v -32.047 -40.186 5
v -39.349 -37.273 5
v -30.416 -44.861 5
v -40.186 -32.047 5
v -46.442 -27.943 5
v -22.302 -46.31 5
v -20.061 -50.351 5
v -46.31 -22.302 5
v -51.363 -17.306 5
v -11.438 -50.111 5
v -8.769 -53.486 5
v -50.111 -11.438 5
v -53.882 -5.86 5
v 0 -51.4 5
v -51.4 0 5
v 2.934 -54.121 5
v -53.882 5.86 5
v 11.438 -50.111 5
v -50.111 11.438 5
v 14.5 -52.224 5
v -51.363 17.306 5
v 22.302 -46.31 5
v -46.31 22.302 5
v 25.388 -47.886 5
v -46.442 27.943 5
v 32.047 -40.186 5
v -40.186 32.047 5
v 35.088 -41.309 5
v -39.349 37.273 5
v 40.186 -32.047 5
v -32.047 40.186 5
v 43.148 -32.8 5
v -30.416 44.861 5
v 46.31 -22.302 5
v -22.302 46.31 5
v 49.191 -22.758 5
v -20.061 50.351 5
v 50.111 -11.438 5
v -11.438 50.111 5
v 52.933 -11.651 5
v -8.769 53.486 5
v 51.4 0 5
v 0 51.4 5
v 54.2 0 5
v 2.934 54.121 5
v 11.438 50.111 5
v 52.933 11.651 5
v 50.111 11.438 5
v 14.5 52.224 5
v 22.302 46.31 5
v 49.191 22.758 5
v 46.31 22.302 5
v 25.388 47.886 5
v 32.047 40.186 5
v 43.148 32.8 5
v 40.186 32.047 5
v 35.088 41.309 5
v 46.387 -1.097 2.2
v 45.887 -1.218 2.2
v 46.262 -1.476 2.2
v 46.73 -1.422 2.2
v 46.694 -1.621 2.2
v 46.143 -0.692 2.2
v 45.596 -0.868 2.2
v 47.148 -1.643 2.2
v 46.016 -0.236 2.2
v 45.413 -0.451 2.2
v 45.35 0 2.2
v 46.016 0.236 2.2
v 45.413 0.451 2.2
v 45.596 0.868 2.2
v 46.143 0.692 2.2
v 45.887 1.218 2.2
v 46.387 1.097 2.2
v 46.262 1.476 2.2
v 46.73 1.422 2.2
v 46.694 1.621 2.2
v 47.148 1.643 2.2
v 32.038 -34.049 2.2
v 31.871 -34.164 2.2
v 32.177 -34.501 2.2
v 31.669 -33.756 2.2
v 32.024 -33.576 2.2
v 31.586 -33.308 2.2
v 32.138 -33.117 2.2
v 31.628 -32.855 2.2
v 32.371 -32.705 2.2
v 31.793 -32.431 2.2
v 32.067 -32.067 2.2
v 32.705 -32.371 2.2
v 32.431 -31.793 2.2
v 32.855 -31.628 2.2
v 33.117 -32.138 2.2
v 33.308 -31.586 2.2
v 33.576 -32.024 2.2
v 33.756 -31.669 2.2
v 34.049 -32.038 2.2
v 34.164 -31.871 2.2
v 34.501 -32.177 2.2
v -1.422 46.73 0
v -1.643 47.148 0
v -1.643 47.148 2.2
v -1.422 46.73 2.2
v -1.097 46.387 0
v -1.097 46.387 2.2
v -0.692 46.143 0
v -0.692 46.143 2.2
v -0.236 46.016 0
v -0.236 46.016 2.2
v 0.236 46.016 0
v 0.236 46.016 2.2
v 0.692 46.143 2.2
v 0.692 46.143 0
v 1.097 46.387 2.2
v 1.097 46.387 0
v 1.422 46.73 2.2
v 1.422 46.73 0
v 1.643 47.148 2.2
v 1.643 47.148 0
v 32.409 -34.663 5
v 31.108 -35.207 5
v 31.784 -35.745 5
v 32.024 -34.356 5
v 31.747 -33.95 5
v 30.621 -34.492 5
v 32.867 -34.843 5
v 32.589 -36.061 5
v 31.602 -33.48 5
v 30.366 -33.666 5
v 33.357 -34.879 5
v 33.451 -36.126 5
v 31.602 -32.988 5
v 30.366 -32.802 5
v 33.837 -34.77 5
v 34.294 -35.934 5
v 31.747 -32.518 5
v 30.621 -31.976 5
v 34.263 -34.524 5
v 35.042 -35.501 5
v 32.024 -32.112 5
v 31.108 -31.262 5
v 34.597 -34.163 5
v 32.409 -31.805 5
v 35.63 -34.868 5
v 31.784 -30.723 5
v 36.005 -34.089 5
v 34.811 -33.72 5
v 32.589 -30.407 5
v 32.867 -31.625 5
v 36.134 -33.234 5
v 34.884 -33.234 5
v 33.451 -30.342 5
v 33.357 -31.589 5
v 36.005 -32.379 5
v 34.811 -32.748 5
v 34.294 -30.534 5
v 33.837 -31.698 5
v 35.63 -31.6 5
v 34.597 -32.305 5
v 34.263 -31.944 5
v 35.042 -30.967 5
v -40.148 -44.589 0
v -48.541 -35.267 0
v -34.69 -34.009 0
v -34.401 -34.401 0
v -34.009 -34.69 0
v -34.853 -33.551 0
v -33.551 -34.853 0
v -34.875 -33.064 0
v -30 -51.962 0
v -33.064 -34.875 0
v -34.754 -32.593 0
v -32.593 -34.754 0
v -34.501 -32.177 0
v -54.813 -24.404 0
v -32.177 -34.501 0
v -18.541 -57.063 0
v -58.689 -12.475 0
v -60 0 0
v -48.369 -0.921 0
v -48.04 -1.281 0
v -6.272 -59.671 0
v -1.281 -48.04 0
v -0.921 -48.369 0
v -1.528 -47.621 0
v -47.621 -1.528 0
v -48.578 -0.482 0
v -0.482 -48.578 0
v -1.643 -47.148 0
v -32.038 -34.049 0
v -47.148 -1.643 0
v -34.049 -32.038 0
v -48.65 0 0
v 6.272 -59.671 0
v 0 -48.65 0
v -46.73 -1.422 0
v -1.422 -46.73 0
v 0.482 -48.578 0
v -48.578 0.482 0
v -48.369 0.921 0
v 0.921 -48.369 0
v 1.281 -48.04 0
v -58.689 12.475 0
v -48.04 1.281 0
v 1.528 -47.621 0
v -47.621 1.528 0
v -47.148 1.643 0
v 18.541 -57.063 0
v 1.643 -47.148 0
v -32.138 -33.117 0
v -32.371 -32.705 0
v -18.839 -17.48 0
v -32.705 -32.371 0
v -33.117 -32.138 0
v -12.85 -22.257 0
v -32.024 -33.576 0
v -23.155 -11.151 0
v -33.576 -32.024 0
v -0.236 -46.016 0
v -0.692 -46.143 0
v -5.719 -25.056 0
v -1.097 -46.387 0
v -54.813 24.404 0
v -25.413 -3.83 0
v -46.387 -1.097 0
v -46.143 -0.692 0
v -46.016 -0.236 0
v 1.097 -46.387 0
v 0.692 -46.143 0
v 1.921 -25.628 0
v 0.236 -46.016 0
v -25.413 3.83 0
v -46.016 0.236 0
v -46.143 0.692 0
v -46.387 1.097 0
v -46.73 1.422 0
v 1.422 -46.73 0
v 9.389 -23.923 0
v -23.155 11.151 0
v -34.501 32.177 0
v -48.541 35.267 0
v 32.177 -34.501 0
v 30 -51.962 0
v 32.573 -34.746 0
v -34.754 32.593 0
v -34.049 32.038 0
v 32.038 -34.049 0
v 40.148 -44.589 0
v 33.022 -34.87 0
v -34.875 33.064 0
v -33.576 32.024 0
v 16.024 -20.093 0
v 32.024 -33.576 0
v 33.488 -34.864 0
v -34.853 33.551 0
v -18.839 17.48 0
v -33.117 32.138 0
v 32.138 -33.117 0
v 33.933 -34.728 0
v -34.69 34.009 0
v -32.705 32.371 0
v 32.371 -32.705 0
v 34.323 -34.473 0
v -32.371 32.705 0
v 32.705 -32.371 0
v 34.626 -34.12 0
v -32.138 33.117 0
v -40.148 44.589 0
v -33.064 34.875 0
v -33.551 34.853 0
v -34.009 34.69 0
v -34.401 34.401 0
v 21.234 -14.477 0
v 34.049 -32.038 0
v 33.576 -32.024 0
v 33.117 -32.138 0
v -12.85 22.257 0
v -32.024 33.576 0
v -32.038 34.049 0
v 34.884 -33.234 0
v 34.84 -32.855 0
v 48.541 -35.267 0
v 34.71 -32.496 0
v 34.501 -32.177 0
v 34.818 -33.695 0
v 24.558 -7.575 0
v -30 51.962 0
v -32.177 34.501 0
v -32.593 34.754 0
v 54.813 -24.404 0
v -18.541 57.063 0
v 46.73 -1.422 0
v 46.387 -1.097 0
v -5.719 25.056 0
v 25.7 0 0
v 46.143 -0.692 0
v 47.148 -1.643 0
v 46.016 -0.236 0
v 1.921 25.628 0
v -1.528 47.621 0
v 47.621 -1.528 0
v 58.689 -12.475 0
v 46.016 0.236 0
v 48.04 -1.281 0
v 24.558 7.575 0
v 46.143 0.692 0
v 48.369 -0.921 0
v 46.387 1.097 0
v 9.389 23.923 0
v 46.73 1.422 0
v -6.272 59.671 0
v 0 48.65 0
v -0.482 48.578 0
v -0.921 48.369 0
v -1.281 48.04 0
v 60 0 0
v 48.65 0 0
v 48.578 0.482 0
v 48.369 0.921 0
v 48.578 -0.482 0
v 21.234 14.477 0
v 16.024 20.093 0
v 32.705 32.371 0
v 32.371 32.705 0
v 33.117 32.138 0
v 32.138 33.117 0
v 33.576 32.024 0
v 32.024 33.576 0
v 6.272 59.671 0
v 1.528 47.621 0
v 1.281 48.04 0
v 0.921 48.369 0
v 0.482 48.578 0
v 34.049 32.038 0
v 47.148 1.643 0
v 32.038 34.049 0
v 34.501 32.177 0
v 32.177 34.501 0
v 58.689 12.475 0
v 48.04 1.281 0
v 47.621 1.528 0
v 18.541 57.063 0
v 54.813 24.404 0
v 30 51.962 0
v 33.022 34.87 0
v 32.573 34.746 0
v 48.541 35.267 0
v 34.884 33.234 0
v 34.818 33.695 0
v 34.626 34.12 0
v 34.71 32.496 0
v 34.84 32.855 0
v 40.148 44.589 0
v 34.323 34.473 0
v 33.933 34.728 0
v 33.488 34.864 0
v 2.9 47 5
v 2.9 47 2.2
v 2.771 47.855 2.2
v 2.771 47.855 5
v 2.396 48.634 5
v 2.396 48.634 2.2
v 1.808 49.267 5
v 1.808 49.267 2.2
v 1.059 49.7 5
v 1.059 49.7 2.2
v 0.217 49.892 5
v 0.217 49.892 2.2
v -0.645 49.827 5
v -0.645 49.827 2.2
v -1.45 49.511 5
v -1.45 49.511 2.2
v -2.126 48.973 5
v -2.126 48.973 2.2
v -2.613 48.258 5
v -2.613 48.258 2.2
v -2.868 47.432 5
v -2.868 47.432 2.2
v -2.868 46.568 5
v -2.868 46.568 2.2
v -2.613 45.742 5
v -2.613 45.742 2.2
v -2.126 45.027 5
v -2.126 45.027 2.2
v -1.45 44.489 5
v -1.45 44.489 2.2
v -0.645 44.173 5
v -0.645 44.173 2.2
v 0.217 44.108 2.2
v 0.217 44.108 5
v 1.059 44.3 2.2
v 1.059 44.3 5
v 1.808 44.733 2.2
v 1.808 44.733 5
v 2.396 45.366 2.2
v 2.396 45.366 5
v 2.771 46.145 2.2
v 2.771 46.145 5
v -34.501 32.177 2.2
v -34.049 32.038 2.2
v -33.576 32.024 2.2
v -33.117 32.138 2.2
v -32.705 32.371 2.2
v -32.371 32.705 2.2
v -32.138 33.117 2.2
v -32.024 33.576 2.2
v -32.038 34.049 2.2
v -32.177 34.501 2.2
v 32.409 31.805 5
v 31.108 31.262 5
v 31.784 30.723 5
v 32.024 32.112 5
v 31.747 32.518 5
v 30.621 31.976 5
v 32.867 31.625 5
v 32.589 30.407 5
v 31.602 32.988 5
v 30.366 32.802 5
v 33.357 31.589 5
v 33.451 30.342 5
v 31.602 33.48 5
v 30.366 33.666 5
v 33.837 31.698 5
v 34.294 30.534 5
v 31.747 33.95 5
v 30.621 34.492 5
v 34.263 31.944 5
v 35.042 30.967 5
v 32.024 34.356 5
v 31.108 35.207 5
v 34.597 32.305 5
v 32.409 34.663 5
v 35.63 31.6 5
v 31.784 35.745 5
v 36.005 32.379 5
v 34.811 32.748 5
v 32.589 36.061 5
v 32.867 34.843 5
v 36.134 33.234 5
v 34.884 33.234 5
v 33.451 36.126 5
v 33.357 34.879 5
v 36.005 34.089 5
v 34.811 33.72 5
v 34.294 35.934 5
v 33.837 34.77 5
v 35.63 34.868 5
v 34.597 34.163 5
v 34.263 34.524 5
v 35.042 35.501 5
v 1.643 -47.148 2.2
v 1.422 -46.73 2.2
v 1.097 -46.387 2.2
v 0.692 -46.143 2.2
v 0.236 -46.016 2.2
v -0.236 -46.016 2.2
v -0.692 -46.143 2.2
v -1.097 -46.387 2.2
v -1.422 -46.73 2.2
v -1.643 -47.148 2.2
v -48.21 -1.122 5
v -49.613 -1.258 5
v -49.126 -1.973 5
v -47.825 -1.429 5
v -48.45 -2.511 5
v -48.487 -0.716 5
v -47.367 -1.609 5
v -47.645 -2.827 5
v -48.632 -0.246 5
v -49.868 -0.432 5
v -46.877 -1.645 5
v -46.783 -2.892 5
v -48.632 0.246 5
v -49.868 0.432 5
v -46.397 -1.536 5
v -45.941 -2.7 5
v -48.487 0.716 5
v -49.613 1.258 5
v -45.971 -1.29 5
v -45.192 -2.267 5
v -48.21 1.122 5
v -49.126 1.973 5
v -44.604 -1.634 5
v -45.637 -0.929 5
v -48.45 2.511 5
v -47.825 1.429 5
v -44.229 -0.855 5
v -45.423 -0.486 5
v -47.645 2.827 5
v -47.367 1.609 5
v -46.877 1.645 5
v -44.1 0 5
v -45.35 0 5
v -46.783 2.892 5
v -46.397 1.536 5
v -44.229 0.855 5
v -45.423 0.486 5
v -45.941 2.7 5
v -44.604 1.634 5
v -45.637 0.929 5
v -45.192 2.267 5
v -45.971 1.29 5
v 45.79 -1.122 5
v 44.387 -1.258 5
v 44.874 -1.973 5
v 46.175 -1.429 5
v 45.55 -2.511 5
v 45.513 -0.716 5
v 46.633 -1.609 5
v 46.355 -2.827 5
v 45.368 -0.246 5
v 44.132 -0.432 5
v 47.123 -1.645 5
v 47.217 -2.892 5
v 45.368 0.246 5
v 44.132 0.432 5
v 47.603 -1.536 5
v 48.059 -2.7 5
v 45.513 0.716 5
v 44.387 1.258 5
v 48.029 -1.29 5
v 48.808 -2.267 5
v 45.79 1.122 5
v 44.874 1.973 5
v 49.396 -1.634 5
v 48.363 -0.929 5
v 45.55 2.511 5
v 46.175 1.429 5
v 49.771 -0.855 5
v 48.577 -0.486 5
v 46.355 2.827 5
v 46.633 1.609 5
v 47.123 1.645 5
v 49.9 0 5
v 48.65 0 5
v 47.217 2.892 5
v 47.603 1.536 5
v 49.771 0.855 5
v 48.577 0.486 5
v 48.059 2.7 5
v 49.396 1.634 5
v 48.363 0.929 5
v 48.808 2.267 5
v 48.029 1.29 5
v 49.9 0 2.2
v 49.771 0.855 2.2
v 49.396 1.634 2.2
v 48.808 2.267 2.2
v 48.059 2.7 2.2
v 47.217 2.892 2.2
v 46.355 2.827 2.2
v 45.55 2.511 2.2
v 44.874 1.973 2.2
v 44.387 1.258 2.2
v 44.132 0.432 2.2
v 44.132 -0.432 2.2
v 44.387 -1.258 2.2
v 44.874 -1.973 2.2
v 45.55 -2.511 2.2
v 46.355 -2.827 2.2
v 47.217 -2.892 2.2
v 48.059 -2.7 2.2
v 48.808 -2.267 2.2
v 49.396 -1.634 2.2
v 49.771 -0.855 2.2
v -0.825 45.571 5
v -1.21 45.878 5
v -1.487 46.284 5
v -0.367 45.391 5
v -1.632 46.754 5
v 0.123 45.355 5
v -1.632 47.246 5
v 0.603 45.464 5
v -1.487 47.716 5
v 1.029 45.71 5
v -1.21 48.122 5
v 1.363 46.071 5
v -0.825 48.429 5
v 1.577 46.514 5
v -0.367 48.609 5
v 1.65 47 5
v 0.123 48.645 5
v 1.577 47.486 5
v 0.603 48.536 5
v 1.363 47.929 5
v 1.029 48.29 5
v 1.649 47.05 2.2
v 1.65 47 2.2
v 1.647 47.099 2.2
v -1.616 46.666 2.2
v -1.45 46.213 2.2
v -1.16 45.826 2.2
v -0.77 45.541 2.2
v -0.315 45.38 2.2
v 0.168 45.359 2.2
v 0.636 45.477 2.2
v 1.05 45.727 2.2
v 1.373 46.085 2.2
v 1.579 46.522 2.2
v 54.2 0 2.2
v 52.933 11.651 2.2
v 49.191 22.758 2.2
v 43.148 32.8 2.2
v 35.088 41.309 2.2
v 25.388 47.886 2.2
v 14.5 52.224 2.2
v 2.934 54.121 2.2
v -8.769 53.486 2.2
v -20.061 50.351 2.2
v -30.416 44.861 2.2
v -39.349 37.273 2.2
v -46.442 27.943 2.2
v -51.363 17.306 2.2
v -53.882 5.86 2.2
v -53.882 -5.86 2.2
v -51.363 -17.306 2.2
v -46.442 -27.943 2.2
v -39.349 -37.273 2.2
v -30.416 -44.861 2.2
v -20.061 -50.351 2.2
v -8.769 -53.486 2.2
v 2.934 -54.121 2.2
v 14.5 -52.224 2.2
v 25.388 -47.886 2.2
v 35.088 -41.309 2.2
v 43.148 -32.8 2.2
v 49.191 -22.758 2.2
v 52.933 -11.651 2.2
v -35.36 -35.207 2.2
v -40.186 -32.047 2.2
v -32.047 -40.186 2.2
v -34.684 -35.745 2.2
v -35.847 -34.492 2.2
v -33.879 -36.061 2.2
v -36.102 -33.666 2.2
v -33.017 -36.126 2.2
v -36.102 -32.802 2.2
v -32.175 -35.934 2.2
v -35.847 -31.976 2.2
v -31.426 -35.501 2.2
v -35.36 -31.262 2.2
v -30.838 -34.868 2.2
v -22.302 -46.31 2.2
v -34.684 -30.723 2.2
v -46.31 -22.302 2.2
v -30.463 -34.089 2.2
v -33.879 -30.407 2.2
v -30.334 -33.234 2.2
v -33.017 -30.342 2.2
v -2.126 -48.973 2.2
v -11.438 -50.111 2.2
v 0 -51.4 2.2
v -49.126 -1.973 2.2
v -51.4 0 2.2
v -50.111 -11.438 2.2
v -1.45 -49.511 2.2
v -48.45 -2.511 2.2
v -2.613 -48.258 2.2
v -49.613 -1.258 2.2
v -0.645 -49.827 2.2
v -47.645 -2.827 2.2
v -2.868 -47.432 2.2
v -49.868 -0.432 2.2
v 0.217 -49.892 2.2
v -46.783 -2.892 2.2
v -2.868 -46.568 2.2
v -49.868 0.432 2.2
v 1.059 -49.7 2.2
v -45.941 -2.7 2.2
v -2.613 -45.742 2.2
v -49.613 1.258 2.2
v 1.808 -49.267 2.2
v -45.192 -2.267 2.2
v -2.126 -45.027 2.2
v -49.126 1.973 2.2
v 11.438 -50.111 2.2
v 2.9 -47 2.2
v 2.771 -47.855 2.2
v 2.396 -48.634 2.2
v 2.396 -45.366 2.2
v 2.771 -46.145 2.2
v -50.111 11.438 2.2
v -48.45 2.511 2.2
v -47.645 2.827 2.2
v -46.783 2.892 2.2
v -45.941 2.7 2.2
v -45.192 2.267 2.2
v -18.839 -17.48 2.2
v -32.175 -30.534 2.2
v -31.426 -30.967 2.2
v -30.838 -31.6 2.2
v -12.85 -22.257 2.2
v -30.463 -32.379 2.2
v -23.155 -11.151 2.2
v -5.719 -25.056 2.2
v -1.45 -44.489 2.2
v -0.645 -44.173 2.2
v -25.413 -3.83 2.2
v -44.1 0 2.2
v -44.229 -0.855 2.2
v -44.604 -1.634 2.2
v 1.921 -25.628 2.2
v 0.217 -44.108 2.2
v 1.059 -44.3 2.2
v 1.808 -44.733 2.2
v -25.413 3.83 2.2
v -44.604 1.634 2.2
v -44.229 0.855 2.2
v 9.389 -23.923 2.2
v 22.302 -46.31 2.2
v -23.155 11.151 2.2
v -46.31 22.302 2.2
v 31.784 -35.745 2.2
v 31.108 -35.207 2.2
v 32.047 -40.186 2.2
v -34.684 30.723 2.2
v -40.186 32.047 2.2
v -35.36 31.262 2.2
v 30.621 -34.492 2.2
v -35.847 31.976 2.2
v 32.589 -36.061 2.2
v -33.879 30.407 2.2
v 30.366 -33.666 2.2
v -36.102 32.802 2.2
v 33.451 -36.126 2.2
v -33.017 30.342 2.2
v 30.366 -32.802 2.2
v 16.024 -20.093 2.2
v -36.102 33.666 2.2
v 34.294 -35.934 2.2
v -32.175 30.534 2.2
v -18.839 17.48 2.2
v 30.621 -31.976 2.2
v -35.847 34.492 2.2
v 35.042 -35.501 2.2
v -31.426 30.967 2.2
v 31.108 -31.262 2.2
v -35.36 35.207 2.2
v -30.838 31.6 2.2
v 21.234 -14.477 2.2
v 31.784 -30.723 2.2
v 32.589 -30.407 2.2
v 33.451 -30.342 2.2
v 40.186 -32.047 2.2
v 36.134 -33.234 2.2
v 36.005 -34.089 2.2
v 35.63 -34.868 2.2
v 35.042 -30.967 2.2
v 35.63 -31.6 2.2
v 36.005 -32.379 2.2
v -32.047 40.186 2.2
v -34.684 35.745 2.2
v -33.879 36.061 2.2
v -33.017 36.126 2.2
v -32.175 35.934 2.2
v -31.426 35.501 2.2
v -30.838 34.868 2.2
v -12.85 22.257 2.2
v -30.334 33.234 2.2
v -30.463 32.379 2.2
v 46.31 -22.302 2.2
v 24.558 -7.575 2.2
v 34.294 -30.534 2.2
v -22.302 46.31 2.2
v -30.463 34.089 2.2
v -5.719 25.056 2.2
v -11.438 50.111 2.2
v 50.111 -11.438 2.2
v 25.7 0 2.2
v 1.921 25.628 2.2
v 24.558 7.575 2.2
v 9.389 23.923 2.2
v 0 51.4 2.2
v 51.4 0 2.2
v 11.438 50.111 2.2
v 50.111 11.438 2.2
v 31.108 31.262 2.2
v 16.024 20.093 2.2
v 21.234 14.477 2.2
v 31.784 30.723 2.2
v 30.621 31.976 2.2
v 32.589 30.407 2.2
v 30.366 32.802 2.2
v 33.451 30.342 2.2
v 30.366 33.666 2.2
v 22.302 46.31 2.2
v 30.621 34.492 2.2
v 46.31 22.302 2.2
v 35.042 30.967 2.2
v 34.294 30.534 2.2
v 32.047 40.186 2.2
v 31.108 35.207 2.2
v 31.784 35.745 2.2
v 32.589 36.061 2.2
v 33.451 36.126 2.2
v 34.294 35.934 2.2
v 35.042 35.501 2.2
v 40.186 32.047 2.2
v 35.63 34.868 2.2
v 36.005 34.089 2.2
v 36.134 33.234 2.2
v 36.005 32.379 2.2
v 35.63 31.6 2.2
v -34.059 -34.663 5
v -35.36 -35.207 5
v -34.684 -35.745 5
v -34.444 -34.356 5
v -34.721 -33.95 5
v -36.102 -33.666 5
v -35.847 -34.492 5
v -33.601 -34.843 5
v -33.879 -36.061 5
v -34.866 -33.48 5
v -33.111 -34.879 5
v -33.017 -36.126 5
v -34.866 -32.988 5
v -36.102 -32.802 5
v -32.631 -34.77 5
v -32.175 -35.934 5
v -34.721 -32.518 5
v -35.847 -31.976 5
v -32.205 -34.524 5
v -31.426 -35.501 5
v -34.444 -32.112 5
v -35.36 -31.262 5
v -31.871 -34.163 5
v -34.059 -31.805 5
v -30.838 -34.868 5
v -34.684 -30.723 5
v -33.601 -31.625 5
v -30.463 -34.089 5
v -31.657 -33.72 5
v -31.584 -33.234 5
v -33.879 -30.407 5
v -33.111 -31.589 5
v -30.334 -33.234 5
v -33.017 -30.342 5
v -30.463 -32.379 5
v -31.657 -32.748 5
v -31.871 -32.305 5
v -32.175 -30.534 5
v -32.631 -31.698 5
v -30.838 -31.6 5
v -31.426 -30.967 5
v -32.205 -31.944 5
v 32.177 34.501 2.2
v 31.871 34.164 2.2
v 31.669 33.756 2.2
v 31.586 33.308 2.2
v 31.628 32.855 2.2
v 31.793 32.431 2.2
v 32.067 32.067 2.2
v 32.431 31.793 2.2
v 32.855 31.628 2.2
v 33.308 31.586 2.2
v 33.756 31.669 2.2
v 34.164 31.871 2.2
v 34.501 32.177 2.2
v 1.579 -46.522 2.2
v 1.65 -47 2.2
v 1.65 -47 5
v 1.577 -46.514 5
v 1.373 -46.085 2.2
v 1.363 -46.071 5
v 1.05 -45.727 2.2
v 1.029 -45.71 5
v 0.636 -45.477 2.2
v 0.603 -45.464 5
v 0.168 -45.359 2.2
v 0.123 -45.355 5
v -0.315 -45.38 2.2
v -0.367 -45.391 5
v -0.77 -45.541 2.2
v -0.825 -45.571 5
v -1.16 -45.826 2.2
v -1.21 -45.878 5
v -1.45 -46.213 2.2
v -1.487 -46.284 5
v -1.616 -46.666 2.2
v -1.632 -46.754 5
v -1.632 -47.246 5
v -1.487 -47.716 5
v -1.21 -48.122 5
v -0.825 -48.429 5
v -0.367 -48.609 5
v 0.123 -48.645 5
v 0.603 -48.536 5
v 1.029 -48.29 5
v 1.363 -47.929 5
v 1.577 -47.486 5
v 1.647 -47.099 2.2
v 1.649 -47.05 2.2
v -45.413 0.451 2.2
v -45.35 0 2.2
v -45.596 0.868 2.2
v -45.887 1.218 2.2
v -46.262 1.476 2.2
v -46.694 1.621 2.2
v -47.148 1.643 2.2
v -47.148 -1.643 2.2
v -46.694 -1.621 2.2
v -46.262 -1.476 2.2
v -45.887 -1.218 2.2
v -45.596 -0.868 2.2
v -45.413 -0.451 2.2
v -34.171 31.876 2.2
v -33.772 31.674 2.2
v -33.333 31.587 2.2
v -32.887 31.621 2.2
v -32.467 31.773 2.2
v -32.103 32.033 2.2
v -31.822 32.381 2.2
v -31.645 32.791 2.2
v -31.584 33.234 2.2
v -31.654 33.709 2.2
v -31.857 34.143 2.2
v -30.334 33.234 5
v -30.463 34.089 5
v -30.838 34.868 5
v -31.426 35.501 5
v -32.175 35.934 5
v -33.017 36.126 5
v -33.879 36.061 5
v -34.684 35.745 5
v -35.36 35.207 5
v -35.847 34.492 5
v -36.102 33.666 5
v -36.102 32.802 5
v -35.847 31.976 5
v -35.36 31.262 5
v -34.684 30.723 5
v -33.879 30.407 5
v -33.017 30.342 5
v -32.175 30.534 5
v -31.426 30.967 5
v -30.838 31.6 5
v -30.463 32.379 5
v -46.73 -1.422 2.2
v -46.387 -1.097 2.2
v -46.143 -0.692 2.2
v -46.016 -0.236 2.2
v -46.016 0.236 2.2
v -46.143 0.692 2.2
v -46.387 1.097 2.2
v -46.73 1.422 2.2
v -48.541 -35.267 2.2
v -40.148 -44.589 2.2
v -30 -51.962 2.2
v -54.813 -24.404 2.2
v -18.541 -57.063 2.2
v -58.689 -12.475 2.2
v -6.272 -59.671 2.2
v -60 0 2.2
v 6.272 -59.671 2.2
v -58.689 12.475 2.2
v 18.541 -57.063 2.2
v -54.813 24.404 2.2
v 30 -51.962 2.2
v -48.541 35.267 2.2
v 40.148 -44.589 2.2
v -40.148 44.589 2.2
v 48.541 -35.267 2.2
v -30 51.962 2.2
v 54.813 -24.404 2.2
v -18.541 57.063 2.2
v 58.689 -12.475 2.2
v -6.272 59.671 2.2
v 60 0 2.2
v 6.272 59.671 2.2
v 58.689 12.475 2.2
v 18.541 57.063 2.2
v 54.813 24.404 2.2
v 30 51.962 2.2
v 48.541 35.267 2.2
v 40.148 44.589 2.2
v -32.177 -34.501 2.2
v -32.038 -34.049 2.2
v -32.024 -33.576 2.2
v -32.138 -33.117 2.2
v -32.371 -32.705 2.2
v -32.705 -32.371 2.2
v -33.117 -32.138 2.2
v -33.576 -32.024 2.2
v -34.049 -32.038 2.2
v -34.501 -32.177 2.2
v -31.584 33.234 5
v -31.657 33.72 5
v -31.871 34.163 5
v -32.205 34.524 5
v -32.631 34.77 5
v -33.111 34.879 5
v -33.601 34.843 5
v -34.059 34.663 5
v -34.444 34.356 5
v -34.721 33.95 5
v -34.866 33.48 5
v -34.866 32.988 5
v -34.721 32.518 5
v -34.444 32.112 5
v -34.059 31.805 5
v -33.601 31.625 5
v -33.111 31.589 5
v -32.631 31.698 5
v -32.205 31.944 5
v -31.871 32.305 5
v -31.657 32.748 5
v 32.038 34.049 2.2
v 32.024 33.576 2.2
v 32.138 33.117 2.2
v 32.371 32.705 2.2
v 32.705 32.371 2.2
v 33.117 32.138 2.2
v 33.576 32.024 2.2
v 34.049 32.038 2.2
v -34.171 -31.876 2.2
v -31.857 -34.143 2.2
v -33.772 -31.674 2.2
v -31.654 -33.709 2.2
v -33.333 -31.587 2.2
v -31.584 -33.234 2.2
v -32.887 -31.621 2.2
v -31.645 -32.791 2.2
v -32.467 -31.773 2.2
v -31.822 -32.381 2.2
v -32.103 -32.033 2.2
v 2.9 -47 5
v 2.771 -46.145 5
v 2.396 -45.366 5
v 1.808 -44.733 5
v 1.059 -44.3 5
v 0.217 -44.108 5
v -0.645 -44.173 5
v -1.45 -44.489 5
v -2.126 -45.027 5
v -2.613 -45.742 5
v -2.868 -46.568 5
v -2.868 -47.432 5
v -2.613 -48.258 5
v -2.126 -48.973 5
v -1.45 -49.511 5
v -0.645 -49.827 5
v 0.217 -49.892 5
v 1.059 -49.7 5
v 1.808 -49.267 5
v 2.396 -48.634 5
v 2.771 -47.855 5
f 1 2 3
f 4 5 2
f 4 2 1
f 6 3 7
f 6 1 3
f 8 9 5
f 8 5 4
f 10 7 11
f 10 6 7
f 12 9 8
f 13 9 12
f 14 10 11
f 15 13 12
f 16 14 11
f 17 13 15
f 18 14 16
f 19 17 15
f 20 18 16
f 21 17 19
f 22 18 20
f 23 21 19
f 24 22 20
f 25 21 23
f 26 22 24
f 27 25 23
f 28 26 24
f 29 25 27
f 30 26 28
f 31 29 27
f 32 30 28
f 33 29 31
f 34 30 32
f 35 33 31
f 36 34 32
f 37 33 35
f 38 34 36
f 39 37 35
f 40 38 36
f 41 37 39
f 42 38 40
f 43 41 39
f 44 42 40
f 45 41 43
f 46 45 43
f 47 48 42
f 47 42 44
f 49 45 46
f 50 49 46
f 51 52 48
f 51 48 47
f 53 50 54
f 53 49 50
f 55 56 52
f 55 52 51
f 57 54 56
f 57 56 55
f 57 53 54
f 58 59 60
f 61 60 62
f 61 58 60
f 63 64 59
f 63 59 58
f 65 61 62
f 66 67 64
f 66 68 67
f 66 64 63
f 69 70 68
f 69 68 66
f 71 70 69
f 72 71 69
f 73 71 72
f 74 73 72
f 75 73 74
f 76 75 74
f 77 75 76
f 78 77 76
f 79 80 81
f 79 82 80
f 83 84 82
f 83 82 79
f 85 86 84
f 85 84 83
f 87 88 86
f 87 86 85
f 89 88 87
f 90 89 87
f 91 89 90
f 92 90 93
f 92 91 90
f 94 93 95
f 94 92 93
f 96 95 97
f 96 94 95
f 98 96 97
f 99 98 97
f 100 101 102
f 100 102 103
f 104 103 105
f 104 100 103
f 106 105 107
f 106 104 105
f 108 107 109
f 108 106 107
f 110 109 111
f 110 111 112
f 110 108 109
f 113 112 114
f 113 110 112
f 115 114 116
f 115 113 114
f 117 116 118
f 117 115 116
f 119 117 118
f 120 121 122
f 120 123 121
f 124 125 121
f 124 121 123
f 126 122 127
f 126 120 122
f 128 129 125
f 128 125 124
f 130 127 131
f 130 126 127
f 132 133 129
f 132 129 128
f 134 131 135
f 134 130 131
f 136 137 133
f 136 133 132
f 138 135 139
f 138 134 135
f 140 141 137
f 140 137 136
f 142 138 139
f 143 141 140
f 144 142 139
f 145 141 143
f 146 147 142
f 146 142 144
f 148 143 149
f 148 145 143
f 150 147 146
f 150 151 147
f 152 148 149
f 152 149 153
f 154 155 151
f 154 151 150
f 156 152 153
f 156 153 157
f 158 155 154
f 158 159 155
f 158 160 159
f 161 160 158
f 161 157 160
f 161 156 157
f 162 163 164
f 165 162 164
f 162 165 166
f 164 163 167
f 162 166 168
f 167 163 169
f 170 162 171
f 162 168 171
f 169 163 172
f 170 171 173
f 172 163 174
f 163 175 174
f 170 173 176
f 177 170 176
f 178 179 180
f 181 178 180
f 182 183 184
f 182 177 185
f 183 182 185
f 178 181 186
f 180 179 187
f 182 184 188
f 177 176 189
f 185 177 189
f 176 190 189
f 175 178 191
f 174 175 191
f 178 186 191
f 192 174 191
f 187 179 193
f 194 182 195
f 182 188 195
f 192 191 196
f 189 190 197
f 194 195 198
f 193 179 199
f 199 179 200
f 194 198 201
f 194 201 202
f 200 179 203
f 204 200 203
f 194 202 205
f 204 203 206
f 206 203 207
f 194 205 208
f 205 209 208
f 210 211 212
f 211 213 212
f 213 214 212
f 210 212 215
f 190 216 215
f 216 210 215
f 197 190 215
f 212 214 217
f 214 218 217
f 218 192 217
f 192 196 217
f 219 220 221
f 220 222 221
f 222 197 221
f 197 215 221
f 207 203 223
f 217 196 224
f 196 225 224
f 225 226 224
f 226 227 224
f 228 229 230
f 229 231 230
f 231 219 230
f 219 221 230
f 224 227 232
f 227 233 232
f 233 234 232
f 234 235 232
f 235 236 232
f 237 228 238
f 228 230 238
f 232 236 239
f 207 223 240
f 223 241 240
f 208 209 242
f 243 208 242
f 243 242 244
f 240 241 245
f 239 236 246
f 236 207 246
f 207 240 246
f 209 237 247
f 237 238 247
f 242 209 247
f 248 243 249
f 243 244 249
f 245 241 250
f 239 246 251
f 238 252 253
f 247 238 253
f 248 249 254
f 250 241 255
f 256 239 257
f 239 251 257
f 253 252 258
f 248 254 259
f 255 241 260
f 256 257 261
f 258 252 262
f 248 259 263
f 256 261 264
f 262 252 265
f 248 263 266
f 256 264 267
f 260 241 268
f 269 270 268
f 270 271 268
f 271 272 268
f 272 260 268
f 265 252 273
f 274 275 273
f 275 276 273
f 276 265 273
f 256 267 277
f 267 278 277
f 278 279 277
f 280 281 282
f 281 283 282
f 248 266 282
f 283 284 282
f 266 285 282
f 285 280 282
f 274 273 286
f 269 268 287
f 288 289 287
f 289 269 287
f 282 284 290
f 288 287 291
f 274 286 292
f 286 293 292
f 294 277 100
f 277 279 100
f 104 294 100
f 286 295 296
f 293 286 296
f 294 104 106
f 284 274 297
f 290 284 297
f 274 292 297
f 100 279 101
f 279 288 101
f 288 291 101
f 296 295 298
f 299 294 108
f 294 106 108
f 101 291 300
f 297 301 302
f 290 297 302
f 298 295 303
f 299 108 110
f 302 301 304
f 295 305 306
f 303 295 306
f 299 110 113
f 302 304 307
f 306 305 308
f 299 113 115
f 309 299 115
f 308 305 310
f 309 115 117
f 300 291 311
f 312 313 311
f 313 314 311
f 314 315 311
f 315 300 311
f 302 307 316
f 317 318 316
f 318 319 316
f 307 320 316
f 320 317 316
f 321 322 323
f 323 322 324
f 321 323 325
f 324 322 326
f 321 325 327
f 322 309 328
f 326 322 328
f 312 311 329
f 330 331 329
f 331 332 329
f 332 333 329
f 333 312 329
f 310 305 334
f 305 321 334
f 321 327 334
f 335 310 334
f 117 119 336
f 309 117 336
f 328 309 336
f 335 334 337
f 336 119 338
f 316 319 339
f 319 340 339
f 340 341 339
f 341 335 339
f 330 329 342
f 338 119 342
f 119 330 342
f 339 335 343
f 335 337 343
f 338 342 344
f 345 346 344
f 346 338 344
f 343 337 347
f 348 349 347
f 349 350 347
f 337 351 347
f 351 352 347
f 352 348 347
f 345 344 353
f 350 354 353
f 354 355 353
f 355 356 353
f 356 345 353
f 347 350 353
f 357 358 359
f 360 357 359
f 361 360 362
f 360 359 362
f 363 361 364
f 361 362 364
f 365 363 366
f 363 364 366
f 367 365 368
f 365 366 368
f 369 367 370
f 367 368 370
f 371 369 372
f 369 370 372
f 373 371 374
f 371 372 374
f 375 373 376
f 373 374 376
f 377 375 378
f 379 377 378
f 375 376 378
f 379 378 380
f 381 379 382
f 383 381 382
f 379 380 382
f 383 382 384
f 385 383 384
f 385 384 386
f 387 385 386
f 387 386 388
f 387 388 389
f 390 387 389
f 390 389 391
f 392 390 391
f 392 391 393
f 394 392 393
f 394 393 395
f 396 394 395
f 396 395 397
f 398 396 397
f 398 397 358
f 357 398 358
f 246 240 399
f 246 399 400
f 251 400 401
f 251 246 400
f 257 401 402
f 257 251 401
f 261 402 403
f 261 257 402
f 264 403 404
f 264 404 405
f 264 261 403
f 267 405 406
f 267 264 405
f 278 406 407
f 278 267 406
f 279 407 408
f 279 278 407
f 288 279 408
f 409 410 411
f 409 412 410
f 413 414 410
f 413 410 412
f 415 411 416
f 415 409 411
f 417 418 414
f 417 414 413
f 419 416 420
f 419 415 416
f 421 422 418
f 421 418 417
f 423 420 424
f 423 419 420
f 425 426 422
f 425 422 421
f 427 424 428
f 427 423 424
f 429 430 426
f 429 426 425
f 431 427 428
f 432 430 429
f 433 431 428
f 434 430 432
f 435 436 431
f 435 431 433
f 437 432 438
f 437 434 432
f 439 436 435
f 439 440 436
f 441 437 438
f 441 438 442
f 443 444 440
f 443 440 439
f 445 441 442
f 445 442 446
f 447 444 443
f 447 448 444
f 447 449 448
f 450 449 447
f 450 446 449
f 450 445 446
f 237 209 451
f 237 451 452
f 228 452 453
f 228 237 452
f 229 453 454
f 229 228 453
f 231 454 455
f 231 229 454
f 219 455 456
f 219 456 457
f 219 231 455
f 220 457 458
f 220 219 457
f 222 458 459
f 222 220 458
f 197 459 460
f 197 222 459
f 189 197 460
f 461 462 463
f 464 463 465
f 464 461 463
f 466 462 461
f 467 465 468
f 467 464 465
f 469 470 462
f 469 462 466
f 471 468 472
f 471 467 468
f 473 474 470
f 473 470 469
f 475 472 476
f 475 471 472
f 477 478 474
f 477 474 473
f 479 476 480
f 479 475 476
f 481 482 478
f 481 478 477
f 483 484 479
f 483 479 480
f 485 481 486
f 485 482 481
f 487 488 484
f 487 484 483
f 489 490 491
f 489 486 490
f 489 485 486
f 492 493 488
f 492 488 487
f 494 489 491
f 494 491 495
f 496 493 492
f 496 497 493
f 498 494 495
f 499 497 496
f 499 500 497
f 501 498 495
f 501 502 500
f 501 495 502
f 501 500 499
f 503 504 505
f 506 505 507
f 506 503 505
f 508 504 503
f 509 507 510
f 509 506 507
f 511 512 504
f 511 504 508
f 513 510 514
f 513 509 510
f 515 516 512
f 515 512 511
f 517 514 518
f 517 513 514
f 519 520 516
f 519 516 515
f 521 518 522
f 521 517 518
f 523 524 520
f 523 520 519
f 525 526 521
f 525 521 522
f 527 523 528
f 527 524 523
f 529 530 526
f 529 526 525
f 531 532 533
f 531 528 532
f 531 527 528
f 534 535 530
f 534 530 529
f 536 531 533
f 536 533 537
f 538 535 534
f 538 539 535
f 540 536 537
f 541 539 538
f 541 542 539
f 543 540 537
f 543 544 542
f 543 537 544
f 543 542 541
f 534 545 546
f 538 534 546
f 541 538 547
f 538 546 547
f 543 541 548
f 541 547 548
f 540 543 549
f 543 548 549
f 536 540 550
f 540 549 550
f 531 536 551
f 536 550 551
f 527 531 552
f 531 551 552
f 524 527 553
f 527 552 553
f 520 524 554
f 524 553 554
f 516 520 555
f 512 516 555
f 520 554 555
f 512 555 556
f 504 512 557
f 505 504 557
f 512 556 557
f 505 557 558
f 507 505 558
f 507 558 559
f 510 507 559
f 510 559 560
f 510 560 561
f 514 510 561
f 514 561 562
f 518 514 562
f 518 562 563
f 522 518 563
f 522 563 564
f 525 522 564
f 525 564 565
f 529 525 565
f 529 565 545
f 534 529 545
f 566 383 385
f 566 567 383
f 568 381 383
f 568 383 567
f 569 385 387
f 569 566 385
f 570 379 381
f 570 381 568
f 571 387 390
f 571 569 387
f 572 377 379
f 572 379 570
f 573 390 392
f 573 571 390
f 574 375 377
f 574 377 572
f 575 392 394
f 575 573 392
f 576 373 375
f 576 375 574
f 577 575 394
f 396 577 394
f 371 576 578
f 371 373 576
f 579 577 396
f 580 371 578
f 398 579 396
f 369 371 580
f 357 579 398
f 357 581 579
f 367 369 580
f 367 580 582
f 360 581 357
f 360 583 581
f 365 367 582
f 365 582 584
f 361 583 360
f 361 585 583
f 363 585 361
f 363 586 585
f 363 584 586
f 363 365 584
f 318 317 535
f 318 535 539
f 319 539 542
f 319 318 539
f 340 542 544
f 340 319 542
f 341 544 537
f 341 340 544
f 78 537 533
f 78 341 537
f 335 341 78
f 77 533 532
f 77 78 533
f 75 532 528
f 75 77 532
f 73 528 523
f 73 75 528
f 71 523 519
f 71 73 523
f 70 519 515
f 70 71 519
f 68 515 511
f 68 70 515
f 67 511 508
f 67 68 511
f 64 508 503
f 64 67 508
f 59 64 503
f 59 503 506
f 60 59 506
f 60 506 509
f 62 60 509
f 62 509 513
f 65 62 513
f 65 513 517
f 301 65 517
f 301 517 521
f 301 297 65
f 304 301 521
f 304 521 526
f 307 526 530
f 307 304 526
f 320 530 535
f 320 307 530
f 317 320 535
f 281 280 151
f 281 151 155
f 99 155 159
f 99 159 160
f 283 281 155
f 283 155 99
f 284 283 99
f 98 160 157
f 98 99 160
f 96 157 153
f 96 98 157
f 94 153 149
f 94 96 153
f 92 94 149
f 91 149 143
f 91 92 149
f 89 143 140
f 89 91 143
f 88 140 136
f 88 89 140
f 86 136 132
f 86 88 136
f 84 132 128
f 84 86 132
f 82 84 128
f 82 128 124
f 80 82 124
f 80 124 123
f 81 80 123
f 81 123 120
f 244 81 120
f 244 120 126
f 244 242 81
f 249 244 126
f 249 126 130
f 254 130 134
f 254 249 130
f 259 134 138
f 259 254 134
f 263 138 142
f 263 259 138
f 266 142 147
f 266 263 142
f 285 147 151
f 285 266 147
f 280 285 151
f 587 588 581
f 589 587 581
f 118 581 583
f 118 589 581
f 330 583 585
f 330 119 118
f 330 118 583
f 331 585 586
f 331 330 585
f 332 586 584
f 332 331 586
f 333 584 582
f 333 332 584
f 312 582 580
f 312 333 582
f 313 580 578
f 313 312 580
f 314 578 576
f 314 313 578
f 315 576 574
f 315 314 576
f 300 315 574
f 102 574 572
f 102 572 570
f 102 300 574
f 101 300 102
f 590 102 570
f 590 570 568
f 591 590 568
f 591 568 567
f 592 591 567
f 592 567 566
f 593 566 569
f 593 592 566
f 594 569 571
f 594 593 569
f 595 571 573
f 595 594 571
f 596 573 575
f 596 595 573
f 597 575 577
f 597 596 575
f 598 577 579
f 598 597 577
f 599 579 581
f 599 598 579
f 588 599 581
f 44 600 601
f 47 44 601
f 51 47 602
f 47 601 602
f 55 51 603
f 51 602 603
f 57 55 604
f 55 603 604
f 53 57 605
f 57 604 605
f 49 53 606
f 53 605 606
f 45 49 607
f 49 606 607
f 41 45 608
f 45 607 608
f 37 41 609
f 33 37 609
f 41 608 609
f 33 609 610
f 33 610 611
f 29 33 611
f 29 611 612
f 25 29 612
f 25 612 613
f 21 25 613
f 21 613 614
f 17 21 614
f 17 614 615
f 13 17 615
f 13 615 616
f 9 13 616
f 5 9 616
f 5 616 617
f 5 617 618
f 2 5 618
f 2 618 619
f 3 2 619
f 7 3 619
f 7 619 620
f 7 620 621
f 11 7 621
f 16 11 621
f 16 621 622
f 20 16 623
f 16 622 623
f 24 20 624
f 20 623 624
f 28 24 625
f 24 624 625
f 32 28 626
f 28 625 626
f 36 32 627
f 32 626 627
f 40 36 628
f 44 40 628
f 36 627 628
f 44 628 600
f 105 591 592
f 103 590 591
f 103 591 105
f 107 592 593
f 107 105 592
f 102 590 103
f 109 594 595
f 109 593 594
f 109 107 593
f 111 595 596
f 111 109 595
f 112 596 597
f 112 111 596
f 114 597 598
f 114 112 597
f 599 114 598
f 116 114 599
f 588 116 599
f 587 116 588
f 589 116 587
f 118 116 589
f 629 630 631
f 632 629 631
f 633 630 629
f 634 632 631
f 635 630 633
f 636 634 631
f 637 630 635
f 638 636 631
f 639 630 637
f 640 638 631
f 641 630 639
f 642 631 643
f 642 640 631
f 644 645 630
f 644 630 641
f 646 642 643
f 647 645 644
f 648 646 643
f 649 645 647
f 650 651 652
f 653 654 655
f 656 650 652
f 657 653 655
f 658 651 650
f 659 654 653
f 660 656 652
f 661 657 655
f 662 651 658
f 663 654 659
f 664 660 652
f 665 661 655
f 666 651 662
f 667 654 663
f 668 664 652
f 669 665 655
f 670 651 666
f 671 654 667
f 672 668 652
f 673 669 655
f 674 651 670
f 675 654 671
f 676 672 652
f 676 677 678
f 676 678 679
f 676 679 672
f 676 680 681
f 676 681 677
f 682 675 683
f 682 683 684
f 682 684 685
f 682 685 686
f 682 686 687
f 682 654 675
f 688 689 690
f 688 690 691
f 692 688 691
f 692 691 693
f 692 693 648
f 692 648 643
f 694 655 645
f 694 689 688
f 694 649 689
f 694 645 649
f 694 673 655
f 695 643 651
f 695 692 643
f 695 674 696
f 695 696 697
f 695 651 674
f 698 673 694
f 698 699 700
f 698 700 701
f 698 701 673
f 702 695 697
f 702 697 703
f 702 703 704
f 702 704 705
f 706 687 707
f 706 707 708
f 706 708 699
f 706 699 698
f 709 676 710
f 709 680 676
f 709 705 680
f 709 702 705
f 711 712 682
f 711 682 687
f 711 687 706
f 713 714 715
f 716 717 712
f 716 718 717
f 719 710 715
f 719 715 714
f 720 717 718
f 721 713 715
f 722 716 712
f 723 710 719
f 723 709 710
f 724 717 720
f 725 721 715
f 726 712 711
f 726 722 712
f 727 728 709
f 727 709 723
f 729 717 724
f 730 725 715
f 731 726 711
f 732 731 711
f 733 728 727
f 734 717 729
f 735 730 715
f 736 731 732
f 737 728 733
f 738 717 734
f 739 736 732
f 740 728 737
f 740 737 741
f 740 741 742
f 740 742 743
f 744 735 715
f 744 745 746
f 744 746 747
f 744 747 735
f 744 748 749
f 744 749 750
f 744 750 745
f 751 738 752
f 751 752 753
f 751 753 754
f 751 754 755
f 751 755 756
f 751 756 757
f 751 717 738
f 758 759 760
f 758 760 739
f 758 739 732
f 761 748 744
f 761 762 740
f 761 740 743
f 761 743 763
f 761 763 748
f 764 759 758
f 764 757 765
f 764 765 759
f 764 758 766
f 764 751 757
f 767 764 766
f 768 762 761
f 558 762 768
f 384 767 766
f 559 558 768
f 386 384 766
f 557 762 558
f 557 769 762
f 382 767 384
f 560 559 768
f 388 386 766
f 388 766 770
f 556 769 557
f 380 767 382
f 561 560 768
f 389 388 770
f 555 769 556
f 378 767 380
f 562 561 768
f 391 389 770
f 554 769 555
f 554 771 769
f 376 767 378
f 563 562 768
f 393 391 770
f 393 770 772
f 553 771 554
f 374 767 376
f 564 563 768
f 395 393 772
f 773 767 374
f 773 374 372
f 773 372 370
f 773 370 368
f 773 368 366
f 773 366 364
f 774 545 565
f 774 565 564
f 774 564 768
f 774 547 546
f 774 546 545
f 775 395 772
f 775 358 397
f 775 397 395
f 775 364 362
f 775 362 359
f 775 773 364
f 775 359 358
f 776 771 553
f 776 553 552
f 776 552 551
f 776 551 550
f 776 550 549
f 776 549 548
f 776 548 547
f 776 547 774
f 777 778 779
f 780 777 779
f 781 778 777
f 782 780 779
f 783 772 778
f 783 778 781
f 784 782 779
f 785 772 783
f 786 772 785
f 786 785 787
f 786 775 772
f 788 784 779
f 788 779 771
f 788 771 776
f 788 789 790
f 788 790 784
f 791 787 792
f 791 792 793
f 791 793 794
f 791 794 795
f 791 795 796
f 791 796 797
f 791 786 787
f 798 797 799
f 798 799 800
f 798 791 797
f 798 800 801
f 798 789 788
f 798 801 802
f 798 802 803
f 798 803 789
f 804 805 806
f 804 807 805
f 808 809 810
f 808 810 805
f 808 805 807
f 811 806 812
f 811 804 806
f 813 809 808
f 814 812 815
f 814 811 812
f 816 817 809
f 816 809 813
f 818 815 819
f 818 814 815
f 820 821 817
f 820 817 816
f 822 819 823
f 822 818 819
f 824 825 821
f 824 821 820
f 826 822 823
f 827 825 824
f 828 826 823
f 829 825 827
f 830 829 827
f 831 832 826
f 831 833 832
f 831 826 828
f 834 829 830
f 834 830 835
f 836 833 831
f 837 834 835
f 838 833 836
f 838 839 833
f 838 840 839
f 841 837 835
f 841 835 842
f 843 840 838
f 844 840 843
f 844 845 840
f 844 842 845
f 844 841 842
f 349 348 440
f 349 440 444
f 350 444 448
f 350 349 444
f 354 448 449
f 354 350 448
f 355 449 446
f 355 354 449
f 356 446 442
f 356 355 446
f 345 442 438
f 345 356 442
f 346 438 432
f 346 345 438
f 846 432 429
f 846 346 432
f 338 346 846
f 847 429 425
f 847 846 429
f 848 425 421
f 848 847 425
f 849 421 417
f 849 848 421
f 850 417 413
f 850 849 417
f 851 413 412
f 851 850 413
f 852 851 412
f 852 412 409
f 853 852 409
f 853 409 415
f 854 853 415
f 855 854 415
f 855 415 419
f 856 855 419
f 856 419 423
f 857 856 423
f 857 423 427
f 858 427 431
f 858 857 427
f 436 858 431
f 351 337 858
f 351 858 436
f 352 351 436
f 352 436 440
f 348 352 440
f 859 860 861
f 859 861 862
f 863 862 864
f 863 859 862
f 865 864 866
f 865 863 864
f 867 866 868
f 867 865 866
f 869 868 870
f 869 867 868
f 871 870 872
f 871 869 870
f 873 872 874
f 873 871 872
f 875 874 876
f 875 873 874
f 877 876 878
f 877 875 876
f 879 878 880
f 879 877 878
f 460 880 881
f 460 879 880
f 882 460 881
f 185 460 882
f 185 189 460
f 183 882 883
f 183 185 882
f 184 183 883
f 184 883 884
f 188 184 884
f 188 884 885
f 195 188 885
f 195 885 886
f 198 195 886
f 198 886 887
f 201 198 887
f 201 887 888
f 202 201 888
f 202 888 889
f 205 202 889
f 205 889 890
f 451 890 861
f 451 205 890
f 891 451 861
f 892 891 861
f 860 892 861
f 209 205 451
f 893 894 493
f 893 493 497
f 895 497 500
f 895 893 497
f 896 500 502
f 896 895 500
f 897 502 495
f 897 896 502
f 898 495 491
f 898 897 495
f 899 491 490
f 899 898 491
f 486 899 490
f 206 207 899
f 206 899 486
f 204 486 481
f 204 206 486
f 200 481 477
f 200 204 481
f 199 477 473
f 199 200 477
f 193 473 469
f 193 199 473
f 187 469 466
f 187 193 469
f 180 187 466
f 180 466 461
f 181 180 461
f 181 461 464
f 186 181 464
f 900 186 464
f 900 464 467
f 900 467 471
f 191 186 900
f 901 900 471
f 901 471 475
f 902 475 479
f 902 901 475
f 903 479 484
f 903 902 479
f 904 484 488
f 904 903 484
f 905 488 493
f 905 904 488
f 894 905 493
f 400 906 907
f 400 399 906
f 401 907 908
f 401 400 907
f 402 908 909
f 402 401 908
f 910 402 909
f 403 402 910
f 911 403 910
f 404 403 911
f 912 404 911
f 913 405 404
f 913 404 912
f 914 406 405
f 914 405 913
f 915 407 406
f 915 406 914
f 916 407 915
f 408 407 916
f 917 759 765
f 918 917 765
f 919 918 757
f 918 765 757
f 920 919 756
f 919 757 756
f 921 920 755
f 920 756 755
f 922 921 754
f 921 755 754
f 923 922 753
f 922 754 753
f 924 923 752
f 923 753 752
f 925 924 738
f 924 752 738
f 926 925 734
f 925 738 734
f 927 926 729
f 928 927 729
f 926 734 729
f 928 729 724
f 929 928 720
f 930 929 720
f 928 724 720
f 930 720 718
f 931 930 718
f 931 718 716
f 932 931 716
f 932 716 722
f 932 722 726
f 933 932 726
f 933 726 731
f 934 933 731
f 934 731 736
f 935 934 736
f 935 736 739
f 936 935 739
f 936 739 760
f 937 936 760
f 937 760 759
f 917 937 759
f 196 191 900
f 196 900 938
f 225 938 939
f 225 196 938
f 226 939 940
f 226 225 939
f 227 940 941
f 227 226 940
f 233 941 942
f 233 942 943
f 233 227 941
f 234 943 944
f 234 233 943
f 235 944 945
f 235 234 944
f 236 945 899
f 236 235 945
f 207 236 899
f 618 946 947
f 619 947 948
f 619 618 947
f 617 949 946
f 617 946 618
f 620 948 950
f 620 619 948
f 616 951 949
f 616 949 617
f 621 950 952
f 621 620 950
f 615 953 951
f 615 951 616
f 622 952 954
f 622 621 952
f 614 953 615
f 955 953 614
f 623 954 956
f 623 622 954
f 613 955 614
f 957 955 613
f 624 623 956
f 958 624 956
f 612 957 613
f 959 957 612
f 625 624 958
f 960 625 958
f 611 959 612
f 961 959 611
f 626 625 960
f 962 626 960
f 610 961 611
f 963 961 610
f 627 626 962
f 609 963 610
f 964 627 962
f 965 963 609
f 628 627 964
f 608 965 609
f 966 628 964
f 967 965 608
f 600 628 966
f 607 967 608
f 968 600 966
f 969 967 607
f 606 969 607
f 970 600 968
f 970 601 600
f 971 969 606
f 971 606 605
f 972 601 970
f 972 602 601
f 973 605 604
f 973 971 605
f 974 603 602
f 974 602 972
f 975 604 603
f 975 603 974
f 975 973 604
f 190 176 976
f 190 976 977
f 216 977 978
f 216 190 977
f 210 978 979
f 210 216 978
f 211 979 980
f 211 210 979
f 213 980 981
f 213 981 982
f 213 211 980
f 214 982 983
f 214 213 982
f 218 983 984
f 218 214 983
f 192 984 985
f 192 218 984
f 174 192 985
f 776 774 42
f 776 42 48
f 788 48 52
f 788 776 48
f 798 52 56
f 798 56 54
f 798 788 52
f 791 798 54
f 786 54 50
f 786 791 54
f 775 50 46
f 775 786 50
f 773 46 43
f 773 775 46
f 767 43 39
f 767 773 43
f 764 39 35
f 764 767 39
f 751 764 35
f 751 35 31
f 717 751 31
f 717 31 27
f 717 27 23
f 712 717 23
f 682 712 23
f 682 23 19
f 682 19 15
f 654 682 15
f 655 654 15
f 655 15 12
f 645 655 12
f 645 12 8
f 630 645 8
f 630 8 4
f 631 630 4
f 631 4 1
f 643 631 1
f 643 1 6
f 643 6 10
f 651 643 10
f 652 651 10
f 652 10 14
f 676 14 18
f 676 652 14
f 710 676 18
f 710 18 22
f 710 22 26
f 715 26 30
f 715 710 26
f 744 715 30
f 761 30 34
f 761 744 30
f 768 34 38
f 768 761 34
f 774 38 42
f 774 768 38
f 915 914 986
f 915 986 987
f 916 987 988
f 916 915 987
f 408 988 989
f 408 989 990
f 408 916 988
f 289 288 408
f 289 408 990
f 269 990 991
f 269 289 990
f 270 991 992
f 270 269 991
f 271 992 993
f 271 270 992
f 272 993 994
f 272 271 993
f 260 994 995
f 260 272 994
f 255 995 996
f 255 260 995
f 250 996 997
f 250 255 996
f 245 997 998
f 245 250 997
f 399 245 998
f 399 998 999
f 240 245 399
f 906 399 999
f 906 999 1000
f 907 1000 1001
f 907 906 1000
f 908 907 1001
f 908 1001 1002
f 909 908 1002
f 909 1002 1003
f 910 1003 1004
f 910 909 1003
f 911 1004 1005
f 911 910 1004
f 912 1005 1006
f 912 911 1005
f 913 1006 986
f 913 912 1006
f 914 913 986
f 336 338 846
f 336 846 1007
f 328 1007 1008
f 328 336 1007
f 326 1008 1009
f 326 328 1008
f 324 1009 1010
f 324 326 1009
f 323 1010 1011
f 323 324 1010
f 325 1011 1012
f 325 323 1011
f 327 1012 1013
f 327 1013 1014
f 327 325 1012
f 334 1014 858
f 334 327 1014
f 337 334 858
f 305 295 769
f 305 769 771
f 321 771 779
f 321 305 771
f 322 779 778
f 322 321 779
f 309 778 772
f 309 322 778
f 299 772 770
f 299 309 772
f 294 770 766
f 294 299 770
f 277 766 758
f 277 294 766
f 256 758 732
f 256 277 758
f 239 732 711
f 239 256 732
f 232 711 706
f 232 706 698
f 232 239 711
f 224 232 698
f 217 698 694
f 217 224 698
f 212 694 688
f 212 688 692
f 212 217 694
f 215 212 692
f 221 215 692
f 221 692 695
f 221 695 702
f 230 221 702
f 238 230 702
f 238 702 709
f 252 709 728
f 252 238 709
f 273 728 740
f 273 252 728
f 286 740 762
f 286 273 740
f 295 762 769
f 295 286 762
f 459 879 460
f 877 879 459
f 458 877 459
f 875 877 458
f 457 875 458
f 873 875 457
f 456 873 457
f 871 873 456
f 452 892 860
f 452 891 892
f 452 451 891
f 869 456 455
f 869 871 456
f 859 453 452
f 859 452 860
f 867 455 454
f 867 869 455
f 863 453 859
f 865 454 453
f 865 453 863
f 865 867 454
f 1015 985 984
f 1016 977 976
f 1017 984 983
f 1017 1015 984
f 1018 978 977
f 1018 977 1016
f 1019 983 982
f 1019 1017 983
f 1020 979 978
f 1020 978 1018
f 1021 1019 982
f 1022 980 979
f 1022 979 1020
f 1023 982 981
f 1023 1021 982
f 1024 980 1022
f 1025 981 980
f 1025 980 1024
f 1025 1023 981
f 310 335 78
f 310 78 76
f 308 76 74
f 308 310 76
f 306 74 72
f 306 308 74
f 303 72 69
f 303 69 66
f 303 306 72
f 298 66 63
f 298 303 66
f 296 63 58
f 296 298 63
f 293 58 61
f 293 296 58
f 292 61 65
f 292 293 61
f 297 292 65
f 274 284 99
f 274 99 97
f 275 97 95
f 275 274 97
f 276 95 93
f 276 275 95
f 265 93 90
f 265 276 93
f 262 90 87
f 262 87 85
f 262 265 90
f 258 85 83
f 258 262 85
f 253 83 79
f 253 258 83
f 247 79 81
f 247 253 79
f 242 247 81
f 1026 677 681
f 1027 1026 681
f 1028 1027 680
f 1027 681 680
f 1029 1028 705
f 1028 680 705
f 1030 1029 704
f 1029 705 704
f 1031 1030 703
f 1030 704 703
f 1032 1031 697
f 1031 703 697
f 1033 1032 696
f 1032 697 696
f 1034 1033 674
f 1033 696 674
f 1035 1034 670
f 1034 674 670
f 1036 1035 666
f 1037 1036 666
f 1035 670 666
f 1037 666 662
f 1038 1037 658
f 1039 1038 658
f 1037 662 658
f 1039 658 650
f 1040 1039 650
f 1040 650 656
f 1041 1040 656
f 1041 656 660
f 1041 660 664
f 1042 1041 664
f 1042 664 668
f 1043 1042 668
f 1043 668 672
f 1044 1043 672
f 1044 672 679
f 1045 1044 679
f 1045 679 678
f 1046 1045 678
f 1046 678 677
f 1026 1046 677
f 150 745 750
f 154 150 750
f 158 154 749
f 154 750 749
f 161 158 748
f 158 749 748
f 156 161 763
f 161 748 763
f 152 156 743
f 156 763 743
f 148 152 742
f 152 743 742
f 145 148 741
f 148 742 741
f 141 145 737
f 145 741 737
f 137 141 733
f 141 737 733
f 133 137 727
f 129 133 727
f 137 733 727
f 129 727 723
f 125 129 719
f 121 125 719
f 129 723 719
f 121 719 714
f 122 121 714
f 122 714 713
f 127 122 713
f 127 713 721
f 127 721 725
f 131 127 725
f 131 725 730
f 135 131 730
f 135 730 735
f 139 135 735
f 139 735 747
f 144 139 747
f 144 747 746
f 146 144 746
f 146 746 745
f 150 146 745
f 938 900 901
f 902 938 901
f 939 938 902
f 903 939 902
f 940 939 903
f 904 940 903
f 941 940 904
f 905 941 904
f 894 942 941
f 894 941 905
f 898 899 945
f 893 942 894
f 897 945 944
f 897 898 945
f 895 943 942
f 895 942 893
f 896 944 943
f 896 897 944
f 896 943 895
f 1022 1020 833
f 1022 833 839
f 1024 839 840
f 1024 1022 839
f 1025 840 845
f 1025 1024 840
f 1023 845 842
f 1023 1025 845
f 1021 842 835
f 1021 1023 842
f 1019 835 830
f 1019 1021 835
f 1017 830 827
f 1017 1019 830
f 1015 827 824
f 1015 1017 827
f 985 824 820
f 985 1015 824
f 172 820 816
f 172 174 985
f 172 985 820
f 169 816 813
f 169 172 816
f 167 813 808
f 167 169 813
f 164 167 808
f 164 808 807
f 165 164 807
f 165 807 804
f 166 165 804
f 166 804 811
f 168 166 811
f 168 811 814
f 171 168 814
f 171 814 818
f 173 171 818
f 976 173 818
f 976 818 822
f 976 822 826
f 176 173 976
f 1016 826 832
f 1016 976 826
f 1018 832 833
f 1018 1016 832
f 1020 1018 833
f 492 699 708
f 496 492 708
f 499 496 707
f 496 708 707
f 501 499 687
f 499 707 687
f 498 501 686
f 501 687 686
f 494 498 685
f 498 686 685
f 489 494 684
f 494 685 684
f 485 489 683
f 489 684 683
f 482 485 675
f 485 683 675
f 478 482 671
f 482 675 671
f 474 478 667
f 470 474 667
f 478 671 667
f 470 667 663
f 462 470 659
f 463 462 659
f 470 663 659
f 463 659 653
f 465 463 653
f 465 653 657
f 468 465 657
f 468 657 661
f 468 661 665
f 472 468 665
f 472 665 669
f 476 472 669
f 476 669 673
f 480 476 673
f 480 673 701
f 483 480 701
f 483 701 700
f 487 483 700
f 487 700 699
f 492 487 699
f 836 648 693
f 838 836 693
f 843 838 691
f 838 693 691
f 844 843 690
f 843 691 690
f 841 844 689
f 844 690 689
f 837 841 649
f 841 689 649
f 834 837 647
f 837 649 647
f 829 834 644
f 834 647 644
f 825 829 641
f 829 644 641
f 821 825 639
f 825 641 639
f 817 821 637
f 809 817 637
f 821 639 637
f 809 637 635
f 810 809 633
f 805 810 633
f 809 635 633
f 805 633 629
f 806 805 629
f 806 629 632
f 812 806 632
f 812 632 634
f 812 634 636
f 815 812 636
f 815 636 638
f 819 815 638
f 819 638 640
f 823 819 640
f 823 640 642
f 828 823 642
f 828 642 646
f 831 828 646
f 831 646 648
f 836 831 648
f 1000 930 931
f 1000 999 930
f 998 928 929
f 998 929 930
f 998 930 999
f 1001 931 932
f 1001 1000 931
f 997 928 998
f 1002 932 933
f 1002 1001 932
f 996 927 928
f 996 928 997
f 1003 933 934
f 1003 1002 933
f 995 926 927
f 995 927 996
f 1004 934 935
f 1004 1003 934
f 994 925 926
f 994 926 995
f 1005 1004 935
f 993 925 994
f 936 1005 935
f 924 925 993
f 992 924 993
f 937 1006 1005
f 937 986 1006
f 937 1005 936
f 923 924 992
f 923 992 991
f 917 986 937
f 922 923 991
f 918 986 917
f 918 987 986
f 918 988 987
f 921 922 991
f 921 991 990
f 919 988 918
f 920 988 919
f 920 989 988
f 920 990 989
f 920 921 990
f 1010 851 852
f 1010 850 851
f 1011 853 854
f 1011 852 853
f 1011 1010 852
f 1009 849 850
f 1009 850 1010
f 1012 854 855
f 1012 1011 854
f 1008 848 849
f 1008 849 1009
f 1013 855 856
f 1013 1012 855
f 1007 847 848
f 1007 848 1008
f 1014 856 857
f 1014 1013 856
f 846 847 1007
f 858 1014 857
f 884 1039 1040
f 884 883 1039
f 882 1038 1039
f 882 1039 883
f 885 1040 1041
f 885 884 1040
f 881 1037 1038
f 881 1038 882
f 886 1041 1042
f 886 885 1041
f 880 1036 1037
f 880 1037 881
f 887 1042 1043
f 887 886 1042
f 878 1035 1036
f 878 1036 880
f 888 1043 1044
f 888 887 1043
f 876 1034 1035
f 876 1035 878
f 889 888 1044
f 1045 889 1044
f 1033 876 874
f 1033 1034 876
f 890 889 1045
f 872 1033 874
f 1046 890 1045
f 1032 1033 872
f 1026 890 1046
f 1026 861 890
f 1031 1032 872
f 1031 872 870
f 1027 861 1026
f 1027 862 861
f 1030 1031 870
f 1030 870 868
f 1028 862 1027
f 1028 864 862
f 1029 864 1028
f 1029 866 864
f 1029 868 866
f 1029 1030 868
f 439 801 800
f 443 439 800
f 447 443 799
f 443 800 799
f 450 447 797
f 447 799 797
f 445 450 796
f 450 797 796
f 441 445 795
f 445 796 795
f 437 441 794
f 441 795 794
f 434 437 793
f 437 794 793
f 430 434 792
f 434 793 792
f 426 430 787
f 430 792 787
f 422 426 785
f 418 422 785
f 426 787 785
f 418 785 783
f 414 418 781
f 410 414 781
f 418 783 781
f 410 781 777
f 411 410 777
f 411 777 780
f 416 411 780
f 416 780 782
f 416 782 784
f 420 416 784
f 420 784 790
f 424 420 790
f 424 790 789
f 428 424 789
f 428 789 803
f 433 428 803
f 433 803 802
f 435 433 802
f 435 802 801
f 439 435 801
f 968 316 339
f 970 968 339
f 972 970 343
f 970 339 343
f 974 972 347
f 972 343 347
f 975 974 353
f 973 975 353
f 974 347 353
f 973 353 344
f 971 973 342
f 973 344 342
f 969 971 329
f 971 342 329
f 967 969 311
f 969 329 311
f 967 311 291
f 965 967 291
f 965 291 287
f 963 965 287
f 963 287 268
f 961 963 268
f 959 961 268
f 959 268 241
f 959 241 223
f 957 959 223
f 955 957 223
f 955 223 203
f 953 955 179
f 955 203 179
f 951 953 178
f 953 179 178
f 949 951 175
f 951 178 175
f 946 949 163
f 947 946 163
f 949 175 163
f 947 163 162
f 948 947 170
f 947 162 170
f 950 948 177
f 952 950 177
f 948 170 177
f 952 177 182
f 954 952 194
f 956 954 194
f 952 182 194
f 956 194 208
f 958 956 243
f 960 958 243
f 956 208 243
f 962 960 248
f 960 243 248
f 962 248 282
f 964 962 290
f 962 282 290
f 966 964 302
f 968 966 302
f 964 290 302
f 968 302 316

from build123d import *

# Parameters (mm, degrees)
SKETCH_R      = 60
SKETCH_R_2    = 25.7
SKETCH_R_3    = 1.75
PAD_DEPTH     = 2.2
SKETCH001_R   = 54.2
SKETCH001_R_2 = 51.4
SKETCH001_R_3 = 2.9
SKETCH001_R_4 = 1.65
PAD001_DEPTH  = 5


with BuildPart() as part:
    # Sketch → Pad (new body)
    with BuildSketch(Plane.XY):
        Circle(SKETCH_R)
        Circle(SKETCH_R_2, mode=Mode.SUBTRACT)
        with Locations((0, 47.75)):
            Circle(SKETCH_R_3, mode=Mode.SUBTRACT)
        with Locations((33.764349, 33.764349)):
            Circle(SKETCH_R_3, mode=Mode.SUBTRACT)
        with Locations((47.75, 0)):
            Circle(SKETCH_R_3, mode=Mode.SUBTRACT)
        with Locations((33.764349, -33.764349)):
            Circle(SKETCH_R_3, mode=Mode.SUBTRACT)
        with Locations((0, -47.75)):
            Circle(SKETCH_R_3, mode=Mode.SUBTRACT)
        with Locations((-33.764349, -33.764349)):
            Circle(SKETCH_R_3, mode=Mode.SUBTRACT)
        with Locations((-47.75, 0)):
            Circle(SKETCH_R_3, mode=Mode.SUBTRACT)
        with Locations((-33.764349, 33.764349)):
            Circle(SKETCH_R_3, mode=Mode.SUBTRACT)
    extrude(amount=PAD_DEPTH)

    # Sketch001 → Pad001 (join)
    with BuildSketch(Plane.XY):
        Circle(SKETCH001_R)
        Circle(SKETCH001_R_2, mode=Mode.SUBTRACT)
        with Locations((0, 47)):
            Circle(SKETCH001_R_3)
        with Locations((0, 47)):
            Circle(SKETCH001_R_4, mode=Mode.SUBTRACT)
        with Locations((33.234019, 33.234019)):
            Circle(SKETCH001_R_3)
        with Locations((33.234019, 33.234019)):
            Circle(SKETCH001_R_4, mode=Mode.SUBTRACT)
        with Locations((47, 0)):
            Circle(SKETCH001_R_3)
        with Locations((47, 0)):
            Circle(SKETCH001_R_4, mode=Mode.SUBTRACT)
        with Locations((33.234019, -33.234019)):
            Circle(SKETCH001_R_3)
        with Locations((33.234019, -33.234019)):
            Circle(SKETCH001_R_4, mode=Mode.SUBTRACT)
        with Locations((0, -47)):
            Circle(SKETCH001_R_3)
        with Locations((0, -47)):
            Circle(SKETCH001_R_4, mode=Mode.SUBTRACT)
        with Locations((-33.234019, -33.234019)):
            Circle(SKETCH001_R_3)
        with Locations((-33.234019, -33.234019)):
            Circle(SKETCH001_R_4, mode=Mode.SUBTRACT)
        with Locations((-47, 0)):
            Circle(SKETCH001_R_3)
        with Locations((-47, 0)):
            Circle(SKETCH001_R_4, mode=Mode.SUBTRACT)
        with Locations((-33.234019, 33.234019)):
            Circle(SKETCH001_R_3)
        with Locations((-33.234019, 33.234019)):
            Circle(SKETCH001_R_4, mode=Mode.SUBTRACT)
    extrude(amount=PAD001_DEPTH)


solid = part.part
